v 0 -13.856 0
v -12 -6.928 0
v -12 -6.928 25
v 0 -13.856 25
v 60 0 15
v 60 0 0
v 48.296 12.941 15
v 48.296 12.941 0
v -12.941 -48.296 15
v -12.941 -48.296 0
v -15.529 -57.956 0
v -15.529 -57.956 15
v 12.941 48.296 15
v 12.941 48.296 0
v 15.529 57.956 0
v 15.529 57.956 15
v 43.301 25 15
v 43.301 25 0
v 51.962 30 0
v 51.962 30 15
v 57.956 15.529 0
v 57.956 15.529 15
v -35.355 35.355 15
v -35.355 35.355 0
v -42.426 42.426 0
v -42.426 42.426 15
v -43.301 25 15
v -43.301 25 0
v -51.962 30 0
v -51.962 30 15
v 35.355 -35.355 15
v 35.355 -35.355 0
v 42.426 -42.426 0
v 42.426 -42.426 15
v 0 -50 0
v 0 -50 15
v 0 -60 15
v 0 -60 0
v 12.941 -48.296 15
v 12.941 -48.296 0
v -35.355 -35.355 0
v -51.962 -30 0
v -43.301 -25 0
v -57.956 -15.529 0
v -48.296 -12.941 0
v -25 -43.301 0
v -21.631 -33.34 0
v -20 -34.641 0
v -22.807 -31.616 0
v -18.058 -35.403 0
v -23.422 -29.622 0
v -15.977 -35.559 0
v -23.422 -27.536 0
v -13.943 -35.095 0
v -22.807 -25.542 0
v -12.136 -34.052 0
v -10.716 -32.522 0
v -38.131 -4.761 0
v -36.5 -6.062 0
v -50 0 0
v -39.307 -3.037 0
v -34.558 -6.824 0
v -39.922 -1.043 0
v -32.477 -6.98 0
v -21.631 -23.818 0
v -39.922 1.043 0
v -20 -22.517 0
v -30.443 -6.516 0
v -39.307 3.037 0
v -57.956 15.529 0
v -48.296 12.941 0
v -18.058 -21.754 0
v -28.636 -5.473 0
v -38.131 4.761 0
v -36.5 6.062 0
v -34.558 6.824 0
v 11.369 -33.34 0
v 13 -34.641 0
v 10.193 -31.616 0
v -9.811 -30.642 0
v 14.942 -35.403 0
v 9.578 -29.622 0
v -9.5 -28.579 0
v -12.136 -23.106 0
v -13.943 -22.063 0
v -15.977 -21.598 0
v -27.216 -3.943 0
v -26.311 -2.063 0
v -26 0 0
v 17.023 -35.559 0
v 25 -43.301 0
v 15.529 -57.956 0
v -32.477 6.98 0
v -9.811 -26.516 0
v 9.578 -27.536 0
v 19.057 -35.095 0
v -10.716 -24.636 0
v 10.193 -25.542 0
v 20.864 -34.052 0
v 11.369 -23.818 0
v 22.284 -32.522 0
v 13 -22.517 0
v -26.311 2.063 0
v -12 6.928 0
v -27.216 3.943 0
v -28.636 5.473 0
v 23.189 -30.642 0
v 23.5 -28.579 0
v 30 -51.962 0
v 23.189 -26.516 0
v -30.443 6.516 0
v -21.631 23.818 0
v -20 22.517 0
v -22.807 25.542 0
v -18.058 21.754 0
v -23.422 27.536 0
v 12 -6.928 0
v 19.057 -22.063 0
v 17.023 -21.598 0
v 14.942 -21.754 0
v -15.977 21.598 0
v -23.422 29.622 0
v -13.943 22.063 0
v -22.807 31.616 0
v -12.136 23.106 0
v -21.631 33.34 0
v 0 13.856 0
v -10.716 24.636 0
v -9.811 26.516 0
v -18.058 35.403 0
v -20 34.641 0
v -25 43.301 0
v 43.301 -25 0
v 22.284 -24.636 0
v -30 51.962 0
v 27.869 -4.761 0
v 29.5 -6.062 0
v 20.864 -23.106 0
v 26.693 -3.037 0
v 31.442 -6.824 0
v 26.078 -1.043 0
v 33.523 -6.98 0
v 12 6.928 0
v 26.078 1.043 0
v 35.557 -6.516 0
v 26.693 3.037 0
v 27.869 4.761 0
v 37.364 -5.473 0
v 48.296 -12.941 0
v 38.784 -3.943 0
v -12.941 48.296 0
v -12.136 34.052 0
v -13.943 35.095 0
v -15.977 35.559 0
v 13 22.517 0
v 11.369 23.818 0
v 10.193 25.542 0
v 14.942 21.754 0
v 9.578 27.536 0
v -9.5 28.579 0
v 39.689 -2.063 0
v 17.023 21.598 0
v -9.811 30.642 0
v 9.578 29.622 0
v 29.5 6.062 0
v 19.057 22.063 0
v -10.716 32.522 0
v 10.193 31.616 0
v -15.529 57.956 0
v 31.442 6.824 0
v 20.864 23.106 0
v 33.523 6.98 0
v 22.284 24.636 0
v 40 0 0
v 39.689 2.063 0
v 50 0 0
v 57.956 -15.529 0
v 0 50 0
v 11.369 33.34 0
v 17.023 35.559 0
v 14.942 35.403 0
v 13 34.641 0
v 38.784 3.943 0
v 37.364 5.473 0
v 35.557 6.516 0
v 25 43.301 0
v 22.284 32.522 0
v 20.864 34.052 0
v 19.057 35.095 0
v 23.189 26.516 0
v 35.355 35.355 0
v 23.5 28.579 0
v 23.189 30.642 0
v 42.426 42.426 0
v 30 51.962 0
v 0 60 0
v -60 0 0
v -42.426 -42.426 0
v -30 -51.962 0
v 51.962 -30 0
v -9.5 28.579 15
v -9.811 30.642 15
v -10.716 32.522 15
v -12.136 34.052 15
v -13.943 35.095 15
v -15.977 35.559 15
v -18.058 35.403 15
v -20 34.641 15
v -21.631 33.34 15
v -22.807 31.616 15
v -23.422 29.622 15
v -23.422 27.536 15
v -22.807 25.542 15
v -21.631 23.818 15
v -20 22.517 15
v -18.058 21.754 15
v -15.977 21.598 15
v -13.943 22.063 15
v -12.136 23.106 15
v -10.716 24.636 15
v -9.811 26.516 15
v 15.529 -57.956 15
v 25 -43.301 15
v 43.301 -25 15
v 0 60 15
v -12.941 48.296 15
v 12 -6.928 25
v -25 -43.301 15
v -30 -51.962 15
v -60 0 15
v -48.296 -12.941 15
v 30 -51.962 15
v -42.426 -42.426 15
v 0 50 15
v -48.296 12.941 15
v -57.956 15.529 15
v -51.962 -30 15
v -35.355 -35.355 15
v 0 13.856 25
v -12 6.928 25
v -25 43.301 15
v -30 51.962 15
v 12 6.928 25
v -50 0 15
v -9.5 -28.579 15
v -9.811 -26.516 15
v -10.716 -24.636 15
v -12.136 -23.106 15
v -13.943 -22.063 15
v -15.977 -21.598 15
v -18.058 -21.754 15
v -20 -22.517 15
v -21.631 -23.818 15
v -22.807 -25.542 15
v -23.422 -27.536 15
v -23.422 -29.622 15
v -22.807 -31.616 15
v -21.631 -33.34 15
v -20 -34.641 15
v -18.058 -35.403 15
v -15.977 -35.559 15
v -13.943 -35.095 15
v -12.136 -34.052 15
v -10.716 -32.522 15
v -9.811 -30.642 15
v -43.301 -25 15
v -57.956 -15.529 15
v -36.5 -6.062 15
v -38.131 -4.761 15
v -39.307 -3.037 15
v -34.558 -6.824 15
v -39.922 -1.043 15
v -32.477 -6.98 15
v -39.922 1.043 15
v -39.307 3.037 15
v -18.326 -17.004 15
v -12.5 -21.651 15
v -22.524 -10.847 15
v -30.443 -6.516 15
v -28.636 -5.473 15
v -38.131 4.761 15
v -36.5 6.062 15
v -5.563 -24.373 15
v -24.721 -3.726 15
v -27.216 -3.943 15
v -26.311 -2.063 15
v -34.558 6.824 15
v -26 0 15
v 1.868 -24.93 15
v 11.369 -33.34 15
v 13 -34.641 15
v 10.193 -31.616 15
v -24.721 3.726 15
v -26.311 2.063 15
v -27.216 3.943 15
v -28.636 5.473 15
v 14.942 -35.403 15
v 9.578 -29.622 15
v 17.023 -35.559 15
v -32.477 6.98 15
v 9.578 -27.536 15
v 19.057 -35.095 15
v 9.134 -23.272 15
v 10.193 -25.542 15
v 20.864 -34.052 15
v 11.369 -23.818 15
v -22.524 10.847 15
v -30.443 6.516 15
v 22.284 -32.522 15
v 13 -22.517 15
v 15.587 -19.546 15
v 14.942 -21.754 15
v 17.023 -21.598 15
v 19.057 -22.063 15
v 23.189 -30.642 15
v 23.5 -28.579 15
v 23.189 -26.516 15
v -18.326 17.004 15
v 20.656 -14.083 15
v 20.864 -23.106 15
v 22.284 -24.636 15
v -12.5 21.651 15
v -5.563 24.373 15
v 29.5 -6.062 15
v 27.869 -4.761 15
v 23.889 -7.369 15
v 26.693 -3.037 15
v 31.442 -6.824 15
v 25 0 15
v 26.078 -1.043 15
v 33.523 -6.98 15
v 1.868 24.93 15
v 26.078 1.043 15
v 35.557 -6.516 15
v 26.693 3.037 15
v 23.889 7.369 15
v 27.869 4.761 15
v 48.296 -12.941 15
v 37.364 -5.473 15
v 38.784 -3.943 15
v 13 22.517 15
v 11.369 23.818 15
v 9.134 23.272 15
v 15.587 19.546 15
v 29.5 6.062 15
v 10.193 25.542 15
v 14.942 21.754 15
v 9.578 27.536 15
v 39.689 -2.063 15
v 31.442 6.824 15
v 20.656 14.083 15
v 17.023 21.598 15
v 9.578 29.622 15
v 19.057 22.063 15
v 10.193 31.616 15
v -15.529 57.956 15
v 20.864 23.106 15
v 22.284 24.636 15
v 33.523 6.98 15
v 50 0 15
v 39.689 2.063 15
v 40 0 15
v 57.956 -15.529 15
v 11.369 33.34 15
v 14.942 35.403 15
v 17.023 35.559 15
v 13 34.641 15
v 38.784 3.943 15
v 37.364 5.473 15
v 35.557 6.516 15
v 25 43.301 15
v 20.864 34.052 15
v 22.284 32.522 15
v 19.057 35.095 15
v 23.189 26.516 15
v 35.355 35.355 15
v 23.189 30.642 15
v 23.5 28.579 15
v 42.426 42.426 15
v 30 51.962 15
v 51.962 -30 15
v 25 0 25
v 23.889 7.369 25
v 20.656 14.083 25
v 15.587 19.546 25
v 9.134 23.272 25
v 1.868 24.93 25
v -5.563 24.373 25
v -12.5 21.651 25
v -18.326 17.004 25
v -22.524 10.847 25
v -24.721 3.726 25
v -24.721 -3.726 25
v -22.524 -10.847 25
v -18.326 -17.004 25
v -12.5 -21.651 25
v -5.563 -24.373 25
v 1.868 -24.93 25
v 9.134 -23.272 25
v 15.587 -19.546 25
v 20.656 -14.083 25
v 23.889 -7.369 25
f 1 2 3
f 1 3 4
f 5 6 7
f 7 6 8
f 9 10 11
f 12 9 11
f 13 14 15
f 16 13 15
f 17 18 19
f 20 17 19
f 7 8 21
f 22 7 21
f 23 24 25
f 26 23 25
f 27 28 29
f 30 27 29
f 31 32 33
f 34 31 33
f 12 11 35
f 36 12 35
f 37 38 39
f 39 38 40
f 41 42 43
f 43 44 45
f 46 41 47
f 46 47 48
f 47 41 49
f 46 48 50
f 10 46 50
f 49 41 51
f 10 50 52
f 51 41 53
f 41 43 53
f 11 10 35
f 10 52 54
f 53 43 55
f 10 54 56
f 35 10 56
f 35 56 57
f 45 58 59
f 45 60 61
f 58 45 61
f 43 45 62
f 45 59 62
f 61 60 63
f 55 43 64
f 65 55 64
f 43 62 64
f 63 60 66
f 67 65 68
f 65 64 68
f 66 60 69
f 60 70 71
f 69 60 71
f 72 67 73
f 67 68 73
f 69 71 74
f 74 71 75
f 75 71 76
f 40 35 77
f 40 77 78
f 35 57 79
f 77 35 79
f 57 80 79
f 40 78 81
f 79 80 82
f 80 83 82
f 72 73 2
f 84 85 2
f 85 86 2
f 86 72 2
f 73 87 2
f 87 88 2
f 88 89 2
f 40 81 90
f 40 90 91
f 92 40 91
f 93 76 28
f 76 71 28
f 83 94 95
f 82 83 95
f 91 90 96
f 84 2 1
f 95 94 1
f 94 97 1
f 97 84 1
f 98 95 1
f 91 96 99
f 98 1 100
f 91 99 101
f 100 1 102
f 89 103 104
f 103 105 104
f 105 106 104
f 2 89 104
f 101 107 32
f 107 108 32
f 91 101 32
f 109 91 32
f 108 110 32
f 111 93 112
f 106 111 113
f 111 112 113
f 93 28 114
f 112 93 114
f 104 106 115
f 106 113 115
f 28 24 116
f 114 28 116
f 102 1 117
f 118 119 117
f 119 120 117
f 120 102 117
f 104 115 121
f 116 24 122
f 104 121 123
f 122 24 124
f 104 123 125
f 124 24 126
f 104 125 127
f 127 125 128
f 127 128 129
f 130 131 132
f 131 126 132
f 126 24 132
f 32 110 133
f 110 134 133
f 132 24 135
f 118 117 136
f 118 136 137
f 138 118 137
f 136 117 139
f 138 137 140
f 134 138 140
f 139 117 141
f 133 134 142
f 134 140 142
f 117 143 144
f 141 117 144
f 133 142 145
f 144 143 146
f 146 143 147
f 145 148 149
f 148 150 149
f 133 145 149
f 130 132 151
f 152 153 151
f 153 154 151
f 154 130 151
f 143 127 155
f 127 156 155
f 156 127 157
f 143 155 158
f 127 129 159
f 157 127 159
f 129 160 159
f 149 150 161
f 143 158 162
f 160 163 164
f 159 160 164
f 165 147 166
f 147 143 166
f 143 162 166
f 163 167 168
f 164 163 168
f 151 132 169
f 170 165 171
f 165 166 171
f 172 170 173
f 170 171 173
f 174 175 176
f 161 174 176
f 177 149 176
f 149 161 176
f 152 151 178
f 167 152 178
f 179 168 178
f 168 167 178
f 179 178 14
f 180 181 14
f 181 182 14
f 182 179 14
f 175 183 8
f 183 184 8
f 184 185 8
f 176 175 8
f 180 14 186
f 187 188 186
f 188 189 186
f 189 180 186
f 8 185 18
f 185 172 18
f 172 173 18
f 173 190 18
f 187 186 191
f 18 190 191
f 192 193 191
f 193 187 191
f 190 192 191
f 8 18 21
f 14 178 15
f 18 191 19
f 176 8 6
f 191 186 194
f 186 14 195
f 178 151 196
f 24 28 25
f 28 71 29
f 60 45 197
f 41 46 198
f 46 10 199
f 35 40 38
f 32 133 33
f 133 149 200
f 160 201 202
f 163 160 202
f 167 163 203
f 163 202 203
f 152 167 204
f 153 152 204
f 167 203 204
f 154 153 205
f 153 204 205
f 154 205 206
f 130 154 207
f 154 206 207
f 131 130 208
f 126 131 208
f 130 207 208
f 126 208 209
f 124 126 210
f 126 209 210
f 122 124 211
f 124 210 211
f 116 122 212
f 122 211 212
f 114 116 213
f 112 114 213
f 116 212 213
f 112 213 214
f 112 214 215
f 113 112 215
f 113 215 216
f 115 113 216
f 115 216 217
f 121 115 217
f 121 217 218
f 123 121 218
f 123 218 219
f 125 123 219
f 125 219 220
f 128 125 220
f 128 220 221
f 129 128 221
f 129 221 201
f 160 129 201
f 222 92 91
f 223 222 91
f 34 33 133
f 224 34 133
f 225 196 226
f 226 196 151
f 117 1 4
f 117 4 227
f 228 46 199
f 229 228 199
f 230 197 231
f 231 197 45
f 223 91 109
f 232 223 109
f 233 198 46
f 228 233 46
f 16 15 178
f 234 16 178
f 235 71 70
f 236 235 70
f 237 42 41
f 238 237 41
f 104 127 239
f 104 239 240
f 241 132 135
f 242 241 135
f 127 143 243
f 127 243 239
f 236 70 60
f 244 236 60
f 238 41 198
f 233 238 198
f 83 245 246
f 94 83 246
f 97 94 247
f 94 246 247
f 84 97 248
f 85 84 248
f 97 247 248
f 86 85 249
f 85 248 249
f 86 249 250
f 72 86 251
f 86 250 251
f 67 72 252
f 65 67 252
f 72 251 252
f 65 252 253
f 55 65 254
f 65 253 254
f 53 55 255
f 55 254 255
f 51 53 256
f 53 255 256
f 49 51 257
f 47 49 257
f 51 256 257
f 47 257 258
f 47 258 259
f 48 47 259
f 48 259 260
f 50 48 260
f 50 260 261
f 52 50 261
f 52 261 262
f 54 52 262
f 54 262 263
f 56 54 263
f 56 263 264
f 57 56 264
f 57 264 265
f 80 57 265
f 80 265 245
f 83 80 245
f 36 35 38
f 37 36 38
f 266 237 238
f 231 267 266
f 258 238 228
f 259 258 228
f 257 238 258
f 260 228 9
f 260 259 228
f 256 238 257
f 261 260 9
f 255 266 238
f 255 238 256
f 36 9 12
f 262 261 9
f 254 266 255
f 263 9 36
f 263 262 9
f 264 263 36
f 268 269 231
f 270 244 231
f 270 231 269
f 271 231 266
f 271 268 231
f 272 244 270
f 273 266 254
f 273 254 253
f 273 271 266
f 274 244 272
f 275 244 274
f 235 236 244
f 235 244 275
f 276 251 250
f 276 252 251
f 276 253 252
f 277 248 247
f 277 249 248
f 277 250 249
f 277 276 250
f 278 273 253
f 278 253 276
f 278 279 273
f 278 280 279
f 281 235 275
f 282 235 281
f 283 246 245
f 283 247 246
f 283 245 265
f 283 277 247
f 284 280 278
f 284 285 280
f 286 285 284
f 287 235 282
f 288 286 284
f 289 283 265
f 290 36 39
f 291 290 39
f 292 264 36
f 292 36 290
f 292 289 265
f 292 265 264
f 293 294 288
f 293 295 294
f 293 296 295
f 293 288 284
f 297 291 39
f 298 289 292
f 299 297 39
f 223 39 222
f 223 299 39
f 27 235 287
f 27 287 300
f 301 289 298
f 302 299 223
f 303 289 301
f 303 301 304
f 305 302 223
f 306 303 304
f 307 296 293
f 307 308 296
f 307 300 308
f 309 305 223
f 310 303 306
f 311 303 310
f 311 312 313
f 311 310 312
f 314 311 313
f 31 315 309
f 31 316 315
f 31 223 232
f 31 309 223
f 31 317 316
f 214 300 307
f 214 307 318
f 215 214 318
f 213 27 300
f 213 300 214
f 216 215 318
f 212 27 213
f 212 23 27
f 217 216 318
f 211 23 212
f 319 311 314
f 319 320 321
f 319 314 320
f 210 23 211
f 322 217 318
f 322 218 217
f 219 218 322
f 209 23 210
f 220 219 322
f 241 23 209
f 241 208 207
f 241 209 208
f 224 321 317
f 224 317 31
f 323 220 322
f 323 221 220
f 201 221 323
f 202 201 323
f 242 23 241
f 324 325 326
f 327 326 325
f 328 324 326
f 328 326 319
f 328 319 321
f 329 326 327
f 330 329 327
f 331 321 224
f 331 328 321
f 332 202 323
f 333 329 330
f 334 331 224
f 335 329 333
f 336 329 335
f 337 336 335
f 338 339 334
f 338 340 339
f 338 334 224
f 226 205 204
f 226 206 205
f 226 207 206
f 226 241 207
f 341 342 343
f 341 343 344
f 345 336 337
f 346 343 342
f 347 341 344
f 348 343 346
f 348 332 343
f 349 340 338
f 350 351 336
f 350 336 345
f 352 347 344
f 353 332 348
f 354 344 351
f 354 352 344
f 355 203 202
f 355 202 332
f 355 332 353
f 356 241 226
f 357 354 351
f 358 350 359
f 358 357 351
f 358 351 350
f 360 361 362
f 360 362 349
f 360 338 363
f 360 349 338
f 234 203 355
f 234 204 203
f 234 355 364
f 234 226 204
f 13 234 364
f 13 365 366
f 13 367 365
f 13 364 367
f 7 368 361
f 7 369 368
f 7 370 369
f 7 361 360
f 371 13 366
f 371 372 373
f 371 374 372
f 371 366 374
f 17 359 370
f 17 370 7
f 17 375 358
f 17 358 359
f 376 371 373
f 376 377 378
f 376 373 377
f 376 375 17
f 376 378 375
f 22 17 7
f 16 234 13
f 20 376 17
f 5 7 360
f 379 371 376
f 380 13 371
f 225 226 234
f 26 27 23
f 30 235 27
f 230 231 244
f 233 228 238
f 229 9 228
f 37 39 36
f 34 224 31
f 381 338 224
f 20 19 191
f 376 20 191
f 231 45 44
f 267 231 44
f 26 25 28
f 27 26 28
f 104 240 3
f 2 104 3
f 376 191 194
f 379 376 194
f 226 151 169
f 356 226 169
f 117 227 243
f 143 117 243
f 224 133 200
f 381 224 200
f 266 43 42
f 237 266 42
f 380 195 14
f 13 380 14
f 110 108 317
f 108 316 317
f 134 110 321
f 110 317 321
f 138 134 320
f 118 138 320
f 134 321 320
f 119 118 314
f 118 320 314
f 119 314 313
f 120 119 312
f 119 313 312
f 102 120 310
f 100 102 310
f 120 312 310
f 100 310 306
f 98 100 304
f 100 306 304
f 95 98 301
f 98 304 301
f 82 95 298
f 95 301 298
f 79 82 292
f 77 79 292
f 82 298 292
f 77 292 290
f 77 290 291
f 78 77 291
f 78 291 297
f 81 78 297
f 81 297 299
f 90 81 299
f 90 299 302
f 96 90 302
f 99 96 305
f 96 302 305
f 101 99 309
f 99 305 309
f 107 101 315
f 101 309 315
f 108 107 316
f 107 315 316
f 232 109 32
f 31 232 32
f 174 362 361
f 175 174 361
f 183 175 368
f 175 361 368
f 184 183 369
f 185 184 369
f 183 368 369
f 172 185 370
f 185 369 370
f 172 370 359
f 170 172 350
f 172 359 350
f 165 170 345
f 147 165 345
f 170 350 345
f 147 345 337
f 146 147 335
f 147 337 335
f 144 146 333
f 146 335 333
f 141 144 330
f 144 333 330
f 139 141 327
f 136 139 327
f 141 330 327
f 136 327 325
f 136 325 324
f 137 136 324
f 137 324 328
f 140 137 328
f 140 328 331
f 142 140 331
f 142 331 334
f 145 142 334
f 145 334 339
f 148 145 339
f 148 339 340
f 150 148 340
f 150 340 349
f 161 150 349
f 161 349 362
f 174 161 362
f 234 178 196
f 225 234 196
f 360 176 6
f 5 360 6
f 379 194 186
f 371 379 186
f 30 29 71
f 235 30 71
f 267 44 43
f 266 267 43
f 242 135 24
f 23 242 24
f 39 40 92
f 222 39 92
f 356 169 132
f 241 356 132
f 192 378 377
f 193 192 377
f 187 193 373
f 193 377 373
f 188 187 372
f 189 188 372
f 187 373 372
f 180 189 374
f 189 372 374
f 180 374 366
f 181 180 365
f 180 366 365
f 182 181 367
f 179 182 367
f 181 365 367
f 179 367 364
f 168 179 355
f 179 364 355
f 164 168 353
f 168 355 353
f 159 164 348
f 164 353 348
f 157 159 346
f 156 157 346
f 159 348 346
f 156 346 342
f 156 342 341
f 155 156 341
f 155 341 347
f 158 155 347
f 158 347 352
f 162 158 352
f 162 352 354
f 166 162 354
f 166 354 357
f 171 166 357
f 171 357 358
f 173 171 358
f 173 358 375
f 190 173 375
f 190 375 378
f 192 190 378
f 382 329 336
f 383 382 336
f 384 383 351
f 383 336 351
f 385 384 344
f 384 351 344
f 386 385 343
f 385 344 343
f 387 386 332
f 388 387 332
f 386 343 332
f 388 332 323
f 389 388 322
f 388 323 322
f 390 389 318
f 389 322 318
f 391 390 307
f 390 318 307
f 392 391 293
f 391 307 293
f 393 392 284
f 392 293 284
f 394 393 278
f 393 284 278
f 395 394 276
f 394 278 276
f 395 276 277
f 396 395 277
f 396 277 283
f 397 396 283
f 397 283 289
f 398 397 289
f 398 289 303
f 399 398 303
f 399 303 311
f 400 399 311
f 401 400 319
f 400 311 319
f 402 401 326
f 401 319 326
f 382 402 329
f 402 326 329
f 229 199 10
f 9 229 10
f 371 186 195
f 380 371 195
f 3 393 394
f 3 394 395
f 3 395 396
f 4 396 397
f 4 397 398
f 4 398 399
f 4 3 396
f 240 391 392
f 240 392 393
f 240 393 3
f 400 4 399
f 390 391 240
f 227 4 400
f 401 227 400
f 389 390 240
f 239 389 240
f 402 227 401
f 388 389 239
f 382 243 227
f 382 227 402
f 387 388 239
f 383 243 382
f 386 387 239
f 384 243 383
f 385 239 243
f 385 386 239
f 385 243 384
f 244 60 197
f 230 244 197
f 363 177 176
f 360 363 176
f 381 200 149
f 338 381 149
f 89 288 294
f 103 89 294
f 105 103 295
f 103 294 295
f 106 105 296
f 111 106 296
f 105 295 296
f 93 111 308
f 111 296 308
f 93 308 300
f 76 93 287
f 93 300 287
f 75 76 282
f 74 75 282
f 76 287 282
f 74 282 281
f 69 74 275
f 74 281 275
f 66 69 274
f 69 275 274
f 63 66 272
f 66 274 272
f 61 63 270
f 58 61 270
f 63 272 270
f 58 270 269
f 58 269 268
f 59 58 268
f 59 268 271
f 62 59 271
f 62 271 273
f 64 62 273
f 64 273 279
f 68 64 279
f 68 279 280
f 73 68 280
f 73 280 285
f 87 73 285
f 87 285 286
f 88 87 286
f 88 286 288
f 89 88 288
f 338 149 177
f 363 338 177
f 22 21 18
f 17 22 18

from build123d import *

# Parameters (mm, degrees)
EXTRUDE_1_DEPTH     = 15
SKETCH_2_R          = 25
EXTRUDE_2_DEPTH     = 10
CUT_EXTRUDE_1_DEPTH = 121
SKETCH_4_R          = 7
CUT_EXTRUDE_2_DEPTH = 121


with BuildPart() as part:
    # 草图1 → 凸台-拉伸1 (new body)
    with BuildSketch(Plane.XY):
        Polygon((50, 0), (60, 0), (48.29629, 12.94095), (57.95555, 15.52914), (43.30127, 25), (51.96152, 30), (35.35534, 35.35534), (42.42641, 42.42641), (25, 43.30127), (30, 51.96152), (12.94095, 48.29629), (15.52914, 57.95555), (0, 50), (0, 60), (-12.94095, 48.29629), (-15.52914, 57.95555), (-25, 43.30127), (-30, 51.96152), (-35.35534, 35.35534), (-42.42641, 42.42641), (-43.30127, 25), (-51.96152, 30), (-48.29629, 12.94095), (-57.95555, 15.52914), (-50, 0), (-60, 0), (-48.29629, -12.94095), (-57.95555, -15.52914), (-43.30127, -25), (-51.96152, -30), (-35.35534, -35.35534), (-42.42641, -42.42641), (-25, -43.30127), (-30, -51.96152), (-12.94095, -48.29629), (-15.52914, -57.95555), (0, -50), (0, -60), (12.94095, -48.29629), (15.52914, -57.95555), (25, -43.30127), (30, -51.96152), (35.35534, -35.35534), (42.42641, -42.42641), (43.30127, -25), (51.96152, -30), (48.29629, -12.94095), (57.95555, -15.52914), align=None)
    extrude(amount=EXTRUDE_1_DEPTH)

    # 草图2 → 凸台-拉伸2 (add)
    with BuildSketch(Plane.XY.offset(15)):
        Circle(SKETCH_2_R)
    extrude(amount=EXTRUDE_2_DEPTH)

    # 草图3 → 切除-拉伸1 (cut, symmetric)
    with BuildSketch(Plane.XY.offset(25)):
        Polygon((12, 6.92820323), (0, 13.856406461), (-12, 6.92820323), (-12, -6.92820323), (0, -13.856406461), (12, -6.92820323), align=None)
    extrude(amount=CUT_EXTRUDE_1_DEPTH, both=True, mode=Mode.SUBTRACT)

    # 草图4 → 切除-拉伸2 (cut, symmetric)
    with BuildSketch(Plane.XY.offset(15)):
        with Locations((33, 0)):
            Circle(SKETCH_4_R)
        with Locations((16.5, 28.578838)):
            Circle(SKETCH_4_R)
        with Locations((-16.5, 28.578838)):
            Circle(SKETCH_4_R)
        with Locations((-33, 0)):
            Circle(SKETCH_4_R)
        with Locations((-16.5, -28.578838)):
            Circle(SKETCH_4_R)
        with Locations((16.5, -28.578838)):
            Circle(SKETCH_4_R)
    extrude(amount=CUT_EXTRUDE_2_DEPTH, both=True, mode=Mode.SUBTRACT)


solid = part.part
